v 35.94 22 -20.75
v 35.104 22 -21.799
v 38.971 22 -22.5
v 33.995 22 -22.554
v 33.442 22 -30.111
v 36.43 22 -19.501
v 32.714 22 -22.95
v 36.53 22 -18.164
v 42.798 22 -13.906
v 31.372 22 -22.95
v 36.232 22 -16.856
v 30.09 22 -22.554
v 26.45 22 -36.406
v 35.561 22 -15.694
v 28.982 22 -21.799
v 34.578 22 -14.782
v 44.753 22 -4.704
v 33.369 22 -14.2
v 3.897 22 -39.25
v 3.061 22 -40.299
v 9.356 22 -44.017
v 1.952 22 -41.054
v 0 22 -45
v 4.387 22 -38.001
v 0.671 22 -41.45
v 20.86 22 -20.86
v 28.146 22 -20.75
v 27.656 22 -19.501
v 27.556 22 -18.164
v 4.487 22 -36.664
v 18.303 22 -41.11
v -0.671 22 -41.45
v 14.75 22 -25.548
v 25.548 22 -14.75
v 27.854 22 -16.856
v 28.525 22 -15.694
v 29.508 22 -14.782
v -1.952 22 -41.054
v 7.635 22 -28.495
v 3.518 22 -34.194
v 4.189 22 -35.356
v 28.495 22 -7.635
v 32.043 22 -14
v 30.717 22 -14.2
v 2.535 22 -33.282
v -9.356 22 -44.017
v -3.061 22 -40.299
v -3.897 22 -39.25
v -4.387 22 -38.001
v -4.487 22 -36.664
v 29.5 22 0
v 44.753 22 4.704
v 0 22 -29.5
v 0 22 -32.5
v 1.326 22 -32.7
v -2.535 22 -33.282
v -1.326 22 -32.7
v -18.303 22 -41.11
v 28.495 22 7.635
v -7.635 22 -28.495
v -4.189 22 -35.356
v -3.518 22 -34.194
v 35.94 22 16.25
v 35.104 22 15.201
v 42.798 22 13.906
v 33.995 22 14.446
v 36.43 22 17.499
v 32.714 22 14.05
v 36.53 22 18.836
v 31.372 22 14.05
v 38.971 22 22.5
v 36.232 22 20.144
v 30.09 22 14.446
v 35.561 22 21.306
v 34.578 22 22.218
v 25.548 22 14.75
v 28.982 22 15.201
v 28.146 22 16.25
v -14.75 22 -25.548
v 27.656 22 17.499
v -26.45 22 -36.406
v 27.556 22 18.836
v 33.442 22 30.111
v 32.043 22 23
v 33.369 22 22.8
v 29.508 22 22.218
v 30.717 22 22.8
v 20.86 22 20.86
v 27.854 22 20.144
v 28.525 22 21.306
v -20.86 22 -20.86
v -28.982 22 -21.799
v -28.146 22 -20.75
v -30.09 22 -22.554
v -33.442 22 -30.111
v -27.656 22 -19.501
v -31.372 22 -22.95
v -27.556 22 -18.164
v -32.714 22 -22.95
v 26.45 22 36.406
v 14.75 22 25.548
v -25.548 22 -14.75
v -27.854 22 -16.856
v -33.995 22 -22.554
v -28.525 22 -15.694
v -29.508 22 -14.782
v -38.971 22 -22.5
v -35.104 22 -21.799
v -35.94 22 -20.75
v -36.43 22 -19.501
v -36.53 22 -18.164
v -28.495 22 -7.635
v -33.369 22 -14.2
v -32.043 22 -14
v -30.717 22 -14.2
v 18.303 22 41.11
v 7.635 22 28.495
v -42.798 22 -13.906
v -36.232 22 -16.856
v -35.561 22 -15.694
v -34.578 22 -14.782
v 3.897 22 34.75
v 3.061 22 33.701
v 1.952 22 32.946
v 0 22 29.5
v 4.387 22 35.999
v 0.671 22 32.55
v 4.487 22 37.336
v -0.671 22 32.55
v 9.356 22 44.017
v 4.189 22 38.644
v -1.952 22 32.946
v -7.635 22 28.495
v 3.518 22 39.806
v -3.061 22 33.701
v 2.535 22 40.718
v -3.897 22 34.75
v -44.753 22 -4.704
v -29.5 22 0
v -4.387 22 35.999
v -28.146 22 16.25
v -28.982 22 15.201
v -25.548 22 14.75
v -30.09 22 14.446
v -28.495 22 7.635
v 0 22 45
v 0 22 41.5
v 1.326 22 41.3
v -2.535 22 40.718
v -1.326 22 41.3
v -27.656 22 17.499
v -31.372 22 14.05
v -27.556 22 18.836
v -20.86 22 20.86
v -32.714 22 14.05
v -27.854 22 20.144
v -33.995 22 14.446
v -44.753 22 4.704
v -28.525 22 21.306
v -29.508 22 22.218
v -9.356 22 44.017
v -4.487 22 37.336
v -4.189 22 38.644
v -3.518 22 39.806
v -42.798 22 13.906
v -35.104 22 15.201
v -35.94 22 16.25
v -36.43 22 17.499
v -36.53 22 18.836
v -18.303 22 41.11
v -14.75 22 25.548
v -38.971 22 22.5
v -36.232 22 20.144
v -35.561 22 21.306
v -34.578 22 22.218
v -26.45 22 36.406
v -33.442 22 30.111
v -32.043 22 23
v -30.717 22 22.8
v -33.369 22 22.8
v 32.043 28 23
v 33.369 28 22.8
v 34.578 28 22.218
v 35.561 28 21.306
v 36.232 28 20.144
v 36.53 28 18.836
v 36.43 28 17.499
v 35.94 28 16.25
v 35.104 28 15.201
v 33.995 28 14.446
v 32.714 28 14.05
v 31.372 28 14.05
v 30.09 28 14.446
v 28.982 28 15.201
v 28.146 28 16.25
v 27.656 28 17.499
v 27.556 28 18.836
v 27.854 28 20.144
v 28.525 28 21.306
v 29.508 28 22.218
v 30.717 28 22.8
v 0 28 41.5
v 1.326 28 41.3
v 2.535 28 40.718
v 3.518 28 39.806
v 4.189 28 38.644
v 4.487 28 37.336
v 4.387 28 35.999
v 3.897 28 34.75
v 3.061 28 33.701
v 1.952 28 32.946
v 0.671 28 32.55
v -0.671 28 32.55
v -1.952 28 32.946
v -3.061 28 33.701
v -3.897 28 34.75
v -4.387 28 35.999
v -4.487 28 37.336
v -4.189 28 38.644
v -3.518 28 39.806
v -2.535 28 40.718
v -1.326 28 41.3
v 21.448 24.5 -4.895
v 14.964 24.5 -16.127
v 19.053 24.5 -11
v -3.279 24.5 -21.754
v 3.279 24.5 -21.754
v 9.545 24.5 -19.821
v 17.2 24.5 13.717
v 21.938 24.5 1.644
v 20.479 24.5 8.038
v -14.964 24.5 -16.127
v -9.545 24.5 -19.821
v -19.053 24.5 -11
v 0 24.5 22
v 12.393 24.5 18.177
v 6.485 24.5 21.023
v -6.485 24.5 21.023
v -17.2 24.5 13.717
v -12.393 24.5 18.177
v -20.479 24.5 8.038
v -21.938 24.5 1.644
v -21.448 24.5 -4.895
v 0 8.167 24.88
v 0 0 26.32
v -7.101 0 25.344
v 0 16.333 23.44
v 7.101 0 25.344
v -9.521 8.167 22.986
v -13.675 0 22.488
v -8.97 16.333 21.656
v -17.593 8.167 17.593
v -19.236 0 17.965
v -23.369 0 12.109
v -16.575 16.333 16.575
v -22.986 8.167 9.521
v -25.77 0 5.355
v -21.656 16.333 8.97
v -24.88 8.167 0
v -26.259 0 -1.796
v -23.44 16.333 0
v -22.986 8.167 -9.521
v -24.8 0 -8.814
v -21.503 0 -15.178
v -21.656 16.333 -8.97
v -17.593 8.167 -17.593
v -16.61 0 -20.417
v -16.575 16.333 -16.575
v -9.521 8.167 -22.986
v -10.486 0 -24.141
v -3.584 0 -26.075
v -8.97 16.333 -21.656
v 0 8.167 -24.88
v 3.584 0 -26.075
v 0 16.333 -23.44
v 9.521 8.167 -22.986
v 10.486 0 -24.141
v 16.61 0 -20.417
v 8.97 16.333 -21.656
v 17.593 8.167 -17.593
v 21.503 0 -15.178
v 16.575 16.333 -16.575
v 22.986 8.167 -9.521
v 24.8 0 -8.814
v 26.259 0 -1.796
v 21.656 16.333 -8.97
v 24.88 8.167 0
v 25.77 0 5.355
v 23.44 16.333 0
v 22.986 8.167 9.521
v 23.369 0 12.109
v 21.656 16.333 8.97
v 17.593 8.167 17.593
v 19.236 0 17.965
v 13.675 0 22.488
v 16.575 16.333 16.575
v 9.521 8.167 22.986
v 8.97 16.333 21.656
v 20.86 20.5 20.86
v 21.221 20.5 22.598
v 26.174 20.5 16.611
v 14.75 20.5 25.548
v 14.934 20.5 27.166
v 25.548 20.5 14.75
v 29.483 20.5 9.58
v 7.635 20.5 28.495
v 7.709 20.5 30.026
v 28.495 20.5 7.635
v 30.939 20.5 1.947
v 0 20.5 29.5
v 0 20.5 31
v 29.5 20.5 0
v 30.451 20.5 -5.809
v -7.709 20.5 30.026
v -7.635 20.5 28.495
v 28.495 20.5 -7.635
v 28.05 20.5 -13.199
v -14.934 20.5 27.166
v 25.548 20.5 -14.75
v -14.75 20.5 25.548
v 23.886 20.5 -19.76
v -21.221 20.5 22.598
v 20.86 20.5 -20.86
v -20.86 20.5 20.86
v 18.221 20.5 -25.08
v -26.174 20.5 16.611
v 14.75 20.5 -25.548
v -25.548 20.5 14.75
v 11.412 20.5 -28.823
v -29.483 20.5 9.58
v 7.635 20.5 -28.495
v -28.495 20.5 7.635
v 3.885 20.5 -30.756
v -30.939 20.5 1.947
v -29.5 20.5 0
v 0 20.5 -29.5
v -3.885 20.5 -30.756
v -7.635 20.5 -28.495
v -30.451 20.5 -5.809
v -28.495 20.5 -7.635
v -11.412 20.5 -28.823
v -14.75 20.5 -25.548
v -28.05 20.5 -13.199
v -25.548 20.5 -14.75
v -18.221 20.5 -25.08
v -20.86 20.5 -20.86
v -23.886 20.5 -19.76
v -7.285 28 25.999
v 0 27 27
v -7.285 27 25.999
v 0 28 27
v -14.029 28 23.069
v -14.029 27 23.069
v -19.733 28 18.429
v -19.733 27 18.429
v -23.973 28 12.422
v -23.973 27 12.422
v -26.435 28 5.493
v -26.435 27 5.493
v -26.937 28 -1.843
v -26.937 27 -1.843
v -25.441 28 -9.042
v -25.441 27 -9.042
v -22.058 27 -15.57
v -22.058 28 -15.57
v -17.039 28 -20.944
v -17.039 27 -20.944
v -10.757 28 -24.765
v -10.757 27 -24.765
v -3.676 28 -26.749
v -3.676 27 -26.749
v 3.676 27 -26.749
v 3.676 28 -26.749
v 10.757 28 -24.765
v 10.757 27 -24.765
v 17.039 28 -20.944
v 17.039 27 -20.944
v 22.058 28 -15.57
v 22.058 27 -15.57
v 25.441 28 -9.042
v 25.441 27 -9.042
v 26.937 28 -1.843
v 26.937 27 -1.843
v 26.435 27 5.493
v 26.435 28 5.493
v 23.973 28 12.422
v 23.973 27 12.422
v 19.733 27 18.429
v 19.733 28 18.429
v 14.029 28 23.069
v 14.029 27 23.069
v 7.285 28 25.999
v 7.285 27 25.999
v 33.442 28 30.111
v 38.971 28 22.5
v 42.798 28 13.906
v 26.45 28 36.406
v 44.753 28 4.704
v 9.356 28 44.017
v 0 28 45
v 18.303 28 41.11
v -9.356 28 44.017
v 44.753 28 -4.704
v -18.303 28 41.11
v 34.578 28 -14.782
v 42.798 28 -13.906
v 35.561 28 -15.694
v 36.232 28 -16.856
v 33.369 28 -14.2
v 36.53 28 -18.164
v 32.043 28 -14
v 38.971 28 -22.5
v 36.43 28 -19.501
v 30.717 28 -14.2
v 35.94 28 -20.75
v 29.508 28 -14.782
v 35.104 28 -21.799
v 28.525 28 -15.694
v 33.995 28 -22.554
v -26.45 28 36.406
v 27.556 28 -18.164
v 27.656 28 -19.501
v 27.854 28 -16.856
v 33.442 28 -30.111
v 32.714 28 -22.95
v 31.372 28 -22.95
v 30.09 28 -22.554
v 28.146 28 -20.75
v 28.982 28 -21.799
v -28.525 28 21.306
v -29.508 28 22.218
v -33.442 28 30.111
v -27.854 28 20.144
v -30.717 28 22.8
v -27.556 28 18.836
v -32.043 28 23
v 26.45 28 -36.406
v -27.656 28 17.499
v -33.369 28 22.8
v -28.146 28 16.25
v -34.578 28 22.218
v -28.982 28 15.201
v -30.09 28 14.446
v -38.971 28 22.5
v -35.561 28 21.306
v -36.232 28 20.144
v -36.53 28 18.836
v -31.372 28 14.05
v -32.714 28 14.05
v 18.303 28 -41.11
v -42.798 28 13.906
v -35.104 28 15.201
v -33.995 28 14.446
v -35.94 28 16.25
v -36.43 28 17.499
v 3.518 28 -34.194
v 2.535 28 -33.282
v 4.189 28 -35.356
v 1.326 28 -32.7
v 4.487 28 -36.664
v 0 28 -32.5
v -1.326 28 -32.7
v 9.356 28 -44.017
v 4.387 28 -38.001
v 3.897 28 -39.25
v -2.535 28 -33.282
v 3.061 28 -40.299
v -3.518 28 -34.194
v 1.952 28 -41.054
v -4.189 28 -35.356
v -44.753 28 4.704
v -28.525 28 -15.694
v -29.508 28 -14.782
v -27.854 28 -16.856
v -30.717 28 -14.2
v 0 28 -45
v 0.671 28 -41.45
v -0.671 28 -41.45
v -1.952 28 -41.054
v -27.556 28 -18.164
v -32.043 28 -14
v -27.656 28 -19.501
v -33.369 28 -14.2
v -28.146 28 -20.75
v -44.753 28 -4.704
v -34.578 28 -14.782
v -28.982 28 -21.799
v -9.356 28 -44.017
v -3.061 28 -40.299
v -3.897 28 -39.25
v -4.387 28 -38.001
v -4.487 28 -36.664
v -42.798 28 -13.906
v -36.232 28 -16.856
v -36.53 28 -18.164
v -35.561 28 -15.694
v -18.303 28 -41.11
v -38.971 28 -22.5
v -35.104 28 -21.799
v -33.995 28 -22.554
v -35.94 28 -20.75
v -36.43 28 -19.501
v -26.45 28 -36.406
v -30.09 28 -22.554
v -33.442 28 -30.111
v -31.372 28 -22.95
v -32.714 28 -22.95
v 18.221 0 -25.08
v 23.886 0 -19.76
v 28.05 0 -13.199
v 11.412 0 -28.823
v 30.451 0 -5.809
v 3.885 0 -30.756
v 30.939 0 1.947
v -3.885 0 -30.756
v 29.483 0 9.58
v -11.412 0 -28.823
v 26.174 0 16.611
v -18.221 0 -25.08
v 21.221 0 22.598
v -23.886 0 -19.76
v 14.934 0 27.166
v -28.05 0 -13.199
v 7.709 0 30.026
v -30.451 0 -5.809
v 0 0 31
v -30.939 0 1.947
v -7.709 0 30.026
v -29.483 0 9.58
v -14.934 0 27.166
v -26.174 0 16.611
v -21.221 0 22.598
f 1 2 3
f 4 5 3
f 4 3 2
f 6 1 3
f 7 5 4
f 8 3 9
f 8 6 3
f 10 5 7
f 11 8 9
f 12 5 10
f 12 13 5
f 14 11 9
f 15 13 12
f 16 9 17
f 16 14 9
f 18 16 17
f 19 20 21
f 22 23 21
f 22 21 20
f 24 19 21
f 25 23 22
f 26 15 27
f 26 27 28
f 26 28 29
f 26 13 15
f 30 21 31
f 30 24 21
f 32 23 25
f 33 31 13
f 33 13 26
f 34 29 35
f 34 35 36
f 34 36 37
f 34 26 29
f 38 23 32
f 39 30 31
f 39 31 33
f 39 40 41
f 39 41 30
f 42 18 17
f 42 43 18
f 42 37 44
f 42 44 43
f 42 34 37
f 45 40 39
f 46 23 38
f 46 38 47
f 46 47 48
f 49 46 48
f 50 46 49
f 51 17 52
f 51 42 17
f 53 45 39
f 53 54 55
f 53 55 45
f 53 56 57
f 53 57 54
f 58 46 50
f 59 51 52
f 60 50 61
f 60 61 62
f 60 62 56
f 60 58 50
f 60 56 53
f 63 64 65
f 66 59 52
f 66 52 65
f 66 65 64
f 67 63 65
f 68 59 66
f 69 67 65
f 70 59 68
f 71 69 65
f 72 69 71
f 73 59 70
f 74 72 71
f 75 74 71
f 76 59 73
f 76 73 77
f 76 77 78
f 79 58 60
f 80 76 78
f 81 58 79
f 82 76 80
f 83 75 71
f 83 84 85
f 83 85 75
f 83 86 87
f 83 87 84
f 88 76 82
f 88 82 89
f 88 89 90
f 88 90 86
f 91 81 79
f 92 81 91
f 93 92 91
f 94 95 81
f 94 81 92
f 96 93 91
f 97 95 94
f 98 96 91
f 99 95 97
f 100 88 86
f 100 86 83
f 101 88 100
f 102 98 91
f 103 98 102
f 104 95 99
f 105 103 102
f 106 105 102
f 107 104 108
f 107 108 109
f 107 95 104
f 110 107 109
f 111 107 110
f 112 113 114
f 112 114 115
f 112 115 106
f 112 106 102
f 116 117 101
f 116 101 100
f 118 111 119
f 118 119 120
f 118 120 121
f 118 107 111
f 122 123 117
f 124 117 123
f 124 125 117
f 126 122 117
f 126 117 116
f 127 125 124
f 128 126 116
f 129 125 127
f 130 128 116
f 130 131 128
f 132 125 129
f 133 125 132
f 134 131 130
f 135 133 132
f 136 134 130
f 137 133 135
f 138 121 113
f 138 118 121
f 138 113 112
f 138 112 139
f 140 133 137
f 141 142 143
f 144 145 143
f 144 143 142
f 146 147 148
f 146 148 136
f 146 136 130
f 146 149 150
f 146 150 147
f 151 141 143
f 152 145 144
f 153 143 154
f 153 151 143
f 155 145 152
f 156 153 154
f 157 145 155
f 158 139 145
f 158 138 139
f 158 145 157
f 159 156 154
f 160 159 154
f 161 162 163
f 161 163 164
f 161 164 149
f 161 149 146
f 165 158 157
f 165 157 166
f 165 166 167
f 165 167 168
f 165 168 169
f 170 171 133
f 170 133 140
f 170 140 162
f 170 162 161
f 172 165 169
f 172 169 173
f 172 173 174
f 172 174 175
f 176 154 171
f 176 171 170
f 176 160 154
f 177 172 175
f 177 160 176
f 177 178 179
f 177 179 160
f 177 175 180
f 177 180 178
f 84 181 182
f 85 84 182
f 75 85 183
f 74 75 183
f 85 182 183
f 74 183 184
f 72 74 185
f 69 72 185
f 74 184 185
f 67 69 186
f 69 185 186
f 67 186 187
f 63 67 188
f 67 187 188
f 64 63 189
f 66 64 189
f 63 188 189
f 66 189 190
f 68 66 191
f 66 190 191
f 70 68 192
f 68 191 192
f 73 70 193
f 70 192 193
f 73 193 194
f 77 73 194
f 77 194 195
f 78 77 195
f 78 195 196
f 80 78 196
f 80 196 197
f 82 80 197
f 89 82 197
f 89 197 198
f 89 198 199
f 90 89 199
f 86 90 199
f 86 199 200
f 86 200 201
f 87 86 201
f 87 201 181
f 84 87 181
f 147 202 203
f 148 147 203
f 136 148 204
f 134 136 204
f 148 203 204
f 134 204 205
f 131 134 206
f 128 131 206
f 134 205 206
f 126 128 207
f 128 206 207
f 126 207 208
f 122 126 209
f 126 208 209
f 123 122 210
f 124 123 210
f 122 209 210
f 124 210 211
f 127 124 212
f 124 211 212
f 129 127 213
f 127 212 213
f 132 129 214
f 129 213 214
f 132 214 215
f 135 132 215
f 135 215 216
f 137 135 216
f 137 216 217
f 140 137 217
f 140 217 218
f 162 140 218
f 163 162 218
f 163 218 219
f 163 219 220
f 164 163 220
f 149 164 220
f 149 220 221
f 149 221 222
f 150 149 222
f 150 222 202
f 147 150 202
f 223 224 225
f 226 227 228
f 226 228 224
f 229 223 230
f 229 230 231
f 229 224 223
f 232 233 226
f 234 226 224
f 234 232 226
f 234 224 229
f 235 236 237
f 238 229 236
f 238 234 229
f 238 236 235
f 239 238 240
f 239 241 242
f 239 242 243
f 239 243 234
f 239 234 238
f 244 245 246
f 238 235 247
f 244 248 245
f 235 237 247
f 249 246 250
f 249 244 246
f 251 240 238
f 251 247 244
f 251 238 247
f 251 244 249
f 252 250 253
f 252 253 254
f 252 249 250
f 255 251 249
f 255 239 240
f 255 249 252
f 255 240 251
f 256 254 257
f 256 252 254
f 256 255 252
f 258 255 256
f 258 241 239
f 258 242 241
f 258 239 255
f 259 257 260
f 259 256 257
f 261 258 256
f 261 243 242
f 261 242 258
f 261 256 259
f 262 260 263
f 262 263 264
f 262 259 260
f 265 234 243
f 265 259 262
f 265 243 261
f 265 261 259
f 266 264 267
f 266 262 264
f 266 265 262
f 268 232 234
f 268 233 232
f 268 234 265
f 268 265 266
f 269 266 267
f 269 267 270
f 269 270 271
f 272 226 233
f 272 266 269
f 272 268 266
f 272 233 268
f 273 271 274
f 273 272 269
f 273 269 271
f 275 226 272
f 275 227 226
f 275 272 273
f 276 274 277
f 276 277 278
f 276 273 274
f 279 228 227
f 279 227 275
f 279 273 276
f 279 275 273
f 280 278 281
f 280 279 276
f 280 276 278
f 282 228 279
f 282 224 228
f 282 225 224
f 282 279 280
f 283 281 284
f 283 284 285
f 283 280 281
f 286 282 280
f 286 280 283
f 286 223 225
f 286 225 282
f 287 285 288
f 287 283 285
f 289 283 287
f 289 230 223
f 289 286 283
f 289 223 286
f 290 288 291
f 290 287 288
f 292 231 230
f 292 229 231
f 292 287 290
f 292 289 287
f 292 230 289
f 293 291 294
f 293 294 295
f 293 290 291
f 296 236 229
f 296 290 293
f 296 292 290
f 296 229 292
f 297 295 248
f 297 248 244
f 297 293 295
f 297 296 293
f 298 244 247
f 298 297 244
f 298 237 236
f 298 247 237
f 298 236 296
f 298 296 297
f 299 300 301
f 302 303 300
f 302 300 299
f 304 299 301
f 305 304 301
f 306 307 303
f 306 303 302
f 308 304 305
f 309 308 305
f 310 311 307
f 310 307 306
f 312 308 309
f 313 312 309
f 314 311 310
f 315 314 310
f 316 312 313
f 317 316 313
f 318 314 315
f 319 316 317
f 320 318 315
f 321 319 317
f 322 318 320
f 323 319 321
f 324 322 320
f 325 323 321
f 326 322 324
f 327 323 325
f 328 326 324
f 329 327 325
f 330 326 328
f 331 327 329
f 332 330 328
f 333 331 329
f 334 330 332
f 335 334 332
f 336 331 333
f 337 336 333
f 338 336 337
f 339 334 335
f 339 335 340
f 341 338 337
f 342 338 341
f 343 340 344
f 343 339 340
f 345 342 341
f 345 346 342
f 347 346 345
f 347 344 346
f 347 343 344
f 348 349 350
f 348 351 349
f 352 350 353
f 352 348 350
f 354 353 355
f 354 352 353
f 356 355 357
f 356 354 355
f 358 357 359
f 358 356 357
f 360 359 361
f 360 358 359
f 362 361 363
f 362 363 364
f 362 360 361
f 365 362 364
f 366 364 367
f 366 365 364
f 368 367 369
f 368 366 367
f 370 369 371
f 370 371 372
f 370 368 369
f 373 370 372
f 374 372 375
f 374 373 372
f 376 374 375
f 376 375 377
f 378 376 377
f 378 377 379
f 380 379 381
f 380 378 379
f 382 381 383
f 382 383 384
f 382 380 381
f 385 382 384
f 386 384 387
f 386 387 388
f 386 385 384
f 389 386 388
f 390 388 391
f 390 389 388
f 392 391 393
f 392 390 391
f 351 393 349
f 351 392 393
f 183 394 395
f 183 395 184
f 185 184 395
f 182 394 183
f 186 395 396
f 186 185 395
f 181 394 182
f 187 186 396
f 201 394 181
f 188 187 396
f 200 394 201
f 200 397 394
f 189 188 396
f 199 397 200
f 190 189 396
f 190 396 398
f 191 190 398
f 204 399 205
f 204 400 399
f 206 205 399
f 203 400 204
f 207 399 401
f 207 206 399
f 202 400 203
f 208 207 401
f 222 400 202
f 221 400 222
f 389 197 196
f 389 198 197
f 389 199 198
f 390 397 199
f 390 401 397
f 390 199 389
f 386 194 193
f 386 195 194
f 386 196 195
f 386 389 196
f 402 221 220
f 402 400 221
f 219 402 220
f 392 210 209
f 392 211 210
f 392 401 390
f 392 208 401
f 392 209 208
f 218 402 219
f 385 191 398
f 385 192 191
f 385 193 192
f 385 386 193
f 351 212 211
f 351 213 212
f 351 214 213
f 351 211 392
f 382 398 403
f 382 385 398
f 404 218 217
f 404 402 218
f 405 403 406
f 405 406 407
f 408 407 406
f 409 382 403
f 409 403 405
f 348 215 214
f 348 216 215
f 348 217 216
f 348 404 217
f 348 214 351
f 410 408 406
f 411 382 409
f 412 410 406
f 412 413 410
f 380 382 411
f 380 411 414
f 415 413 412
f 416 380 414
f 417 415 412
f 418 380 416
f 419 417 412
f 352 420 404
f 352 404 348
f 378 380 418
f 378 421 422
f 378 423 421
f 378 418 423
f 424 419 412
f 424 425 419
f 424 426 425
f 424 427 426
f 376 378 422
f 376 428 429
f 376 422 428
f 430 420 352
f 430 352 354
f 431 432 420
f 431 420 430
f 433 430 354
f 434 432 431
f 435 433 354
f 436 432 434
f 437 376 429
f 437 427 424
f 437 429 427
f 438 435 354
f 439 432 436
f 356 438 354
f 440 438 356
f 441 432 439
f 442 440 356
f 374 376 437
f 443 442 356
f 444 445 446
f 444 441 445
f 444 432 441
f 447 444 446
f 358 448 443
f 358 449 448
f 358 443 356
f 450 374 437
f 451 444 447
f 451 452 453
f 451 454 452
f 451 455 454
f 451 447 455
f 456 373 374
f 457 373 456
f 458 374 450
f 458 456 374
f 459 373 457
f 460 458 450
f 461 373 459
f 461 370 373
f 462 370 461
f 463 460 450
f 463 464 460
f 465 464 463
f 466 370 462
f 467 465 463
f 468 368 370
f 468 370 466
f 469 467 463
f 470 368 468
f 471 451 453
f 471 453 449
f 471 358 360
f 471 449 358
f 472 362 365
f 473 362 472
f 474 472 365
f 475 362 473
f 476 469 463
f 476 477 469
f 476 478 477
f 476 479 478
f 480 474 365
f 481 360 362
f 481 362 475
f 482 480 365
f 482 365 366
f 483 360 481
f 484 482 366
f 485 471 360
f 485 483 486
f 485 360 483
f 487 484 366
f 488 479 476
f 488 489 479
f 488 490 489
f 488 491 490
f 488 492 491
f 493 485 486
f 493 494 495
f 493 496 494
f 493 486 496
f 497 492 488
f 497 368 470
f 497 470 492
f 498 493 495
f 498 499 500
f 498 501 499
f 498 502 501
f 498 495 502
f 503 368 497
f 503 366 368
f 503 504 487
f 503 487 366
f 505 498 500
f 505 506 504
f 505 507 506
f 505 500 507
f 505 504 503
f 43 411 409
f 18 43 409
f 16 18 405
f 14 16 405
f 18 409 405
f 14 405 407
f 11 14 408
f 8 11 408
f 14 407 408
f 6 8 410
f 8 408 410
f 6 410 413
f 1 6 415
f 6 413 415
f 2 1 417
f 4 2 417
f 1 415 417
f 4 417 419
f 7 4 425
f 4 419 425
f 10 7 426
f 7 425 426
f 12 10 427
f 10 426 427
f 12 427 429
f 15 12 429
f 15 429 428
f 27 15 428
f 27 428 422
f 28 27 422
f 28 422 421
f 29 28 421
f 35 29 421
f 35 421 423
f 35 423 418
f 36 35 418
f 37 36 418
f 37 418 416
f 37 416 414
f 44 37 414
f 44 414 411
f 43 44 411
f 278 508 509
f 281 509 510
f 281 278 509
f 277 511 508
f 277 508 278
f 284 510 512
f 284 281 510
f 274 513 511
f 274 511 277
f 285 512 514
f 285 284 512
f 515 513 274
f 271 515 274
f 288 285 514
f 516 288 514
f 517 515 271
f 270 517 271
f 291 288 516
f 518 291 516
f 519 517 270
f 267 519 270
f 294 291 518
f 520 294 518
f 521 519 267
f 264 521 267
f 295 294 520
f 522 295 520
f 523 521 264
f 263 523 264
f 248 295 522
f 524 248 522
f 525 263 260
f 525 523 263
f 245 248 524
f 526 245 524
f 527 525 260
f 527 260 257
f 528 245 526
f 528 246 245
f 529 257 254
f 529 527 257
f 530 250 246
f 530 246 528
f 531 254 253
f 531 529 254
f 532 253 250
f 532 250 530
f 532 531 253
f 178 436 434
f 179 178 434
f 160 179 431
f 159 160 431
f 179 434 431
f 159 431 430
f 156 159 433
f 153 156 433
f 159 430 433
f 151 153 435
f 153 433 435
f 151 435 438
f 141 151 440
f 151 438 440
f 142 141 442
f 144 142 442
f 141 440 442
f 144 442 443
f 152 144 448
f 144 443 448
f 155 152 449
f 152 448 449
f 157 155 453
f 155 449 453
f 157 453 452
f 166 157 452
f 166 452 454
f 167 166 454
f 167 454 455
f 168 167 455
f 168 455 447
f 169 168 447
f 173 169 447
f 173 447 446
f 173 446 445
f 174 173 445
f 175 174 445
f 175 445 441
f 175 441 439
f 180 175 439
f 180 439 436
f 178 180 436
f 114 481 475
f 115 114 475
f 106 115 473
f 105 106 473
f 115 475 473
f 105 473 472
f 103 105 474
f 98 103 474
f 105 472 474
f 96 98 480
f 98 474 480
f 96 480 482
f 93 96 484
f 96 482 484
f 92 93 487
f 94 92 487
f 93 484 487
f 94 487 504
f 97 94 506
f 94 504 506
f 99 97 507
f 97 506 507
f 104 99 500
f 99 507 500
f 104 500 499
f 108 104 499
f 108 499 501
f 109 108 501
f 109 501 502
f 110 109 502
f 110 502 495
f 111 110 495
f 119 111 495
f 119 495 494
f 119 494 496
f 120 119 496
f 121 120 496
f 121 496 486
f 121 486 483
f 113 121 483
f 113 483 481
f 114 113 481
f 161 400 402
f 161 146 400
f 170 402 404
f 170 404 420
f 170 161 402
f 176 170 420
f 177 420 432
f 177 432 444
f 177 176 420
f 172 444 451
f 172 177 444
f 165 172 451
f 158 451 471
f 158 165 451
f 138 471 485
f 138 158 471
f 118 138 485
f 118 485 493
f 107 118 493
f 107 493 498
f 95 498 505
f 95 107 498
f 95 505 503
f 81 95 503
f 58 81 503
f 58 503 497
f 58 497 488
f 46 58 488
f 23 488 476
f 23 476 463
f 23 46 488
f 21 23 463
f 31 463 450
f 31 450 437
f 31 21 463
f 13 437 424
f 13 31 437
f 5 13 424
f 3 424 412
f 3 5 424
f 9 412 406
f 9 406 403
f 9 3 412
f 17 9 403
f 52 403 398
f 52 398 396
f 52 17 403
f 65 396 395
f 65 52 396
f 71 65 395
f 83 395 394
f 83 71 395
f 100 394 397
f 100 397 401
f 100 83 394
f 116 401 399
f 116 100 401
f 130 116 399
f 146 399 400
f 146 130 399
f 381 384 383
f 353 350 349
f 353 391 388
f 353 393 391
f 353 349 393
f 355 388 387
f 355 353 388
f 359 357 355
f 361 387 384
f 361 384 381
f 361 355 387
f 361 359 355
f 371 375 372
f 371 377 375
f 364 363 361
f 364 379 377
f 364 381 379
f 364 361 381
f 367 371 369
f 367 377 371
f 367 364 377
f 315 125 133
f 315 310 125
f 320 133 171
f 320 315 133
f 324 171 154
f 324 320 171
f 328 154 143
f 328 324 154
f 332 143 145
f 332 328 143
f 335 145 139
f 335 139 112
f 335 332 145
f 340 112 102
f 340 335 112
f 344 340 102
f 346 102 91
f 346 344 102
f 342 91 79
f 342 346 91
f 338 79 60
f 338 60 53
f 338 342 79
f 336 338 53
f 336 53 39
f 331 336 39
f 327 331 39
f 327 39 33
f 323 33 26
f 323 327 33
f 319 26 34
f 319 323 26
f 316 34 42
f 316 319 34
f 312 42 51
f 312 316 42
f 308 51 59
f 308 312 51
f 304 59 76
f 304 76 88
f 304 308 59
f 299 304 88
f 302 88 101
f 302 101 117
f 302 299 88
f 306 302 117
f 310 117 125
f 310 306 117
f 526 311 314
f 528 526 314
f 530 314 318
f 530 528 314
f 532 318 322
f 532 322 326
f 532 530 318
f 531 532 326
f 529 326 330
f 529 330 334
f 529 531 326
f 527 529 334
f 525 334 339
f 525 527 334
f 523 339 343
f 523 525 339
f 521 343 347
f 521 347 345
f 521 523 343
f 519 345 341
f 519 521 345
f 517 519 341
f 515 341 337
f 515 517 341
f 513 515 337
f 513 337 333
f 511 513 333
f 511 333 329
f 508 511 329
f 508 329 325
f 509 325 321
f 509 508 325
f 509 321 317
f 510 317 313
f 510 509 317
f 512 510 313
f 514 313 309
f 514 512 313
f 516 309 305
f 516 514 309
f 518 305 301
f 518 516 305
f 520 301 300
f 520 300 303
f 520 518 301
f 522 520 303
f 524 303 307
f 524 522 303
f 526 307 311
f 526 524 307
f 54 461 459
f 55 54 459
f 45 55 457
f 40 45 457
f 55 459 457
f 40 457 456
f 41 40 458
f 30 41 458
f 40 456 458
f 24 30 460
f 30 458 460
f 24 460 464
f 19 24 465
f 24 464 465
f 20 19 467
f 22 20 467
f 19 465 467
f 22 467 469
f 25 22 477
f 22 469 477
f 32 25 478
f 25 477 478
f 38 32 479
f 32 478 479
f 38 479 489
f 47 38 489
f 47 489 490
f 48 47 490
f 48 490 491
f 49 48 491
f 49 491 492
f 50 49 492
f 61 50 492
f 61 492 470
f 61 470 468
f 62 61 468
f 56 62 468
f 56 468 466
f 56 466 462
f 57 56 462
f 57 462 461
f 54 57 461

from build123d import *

# Parameters (mm, degrees)
CUT_EXTRUDE1_REACH = 71.527
SKETCH2_R          = 4.5


with BuildPart() as part:
    # Sketch1 → Revolve1 (revolve)
    with BuildSketch(Plane.XY, mode=Mode.PRIVATE) as revolve1_sk:
        Polygon((-45, 28), (-45, 22), (-29.5, 22), (-29.5, 20.5), (-31, 20.5), (-31, 0), (-26.320011027, 0), (-22, 24.5), (0, 24.5), (0, 27), (-27, 27), (-27, 28), align=None)
    revolve(revolve1_sk.sketch.rotate(Axis((0, 30.618797564, 0), (0, -1, 0)), 270), axis=Axis((0, 30.618797564, 0), (0, -1, 0)))

    # Sketch2 → Cut-Extrude1 (cut, up to next)
    with BuildSketch(Plane(origin=(0, 28, 0), x_dir=(1, 0, 0), z_dir=(0, 1, 0)), mode=Mode.PRIVATE) as cut_extrude1_sk1:
        with Locations(Location((0, 37, 0), (0, 0, 270))):
            Circle(SKETCH2_R)
    cut_extrude1_tool1 = extrude(cut_extrude1_sk1.sketch, amount=-CUT_EXTRUDE1_REACH, mode=Mode.PRIVATE) & part.part
    # Sketch2 → Cut-Extrude1 (cut, up to next)
    with BuildSketch(Plane(origin=(0, 28, 0), x_dir=(1, 0, 0), z_dir=(0, 1, 0)), mode=Mode.PRIVATE) as cut_extrude1_sk2:
        with Locations(Location((32.04293994, 18.5, 0), (0, 0, 270))):
            Circle(SKETCH2_R)
    cut_extrude1_tool2 = extrude(cut_extrude1_sk2.sketch, amount=-CUT_EXTRUDE1_REACH, mode=Mode.PRIVATE) & part.part
    # Sketch2 → Cut-Extrude1 (cut, up to next)
    with BuildSketch(Plane(origin=(0, 28, 0), x_dir=(1, 0, 0), z_dir=(0, 1, 0)), mode=Mode.PRIVATE) as cut_extrude1_sk3:
        with Locations(Location((32.04293994, -18.5, 0), (0, 0, 270))):
            Circle(SKETCH2_R)
    cut_extrude1_tool3 = extrude(cut_extrude1_sk3.sketch, amount=-CUT_EXTRUDE1_REACH, mode=Mode.PRIVATE) & part.part
    # Sketch2 → Cut-Extrude1 (cut, up to next)
    with BuildSketch(Plane(origin=(0, 28, 0), x_dir=(1, 0, 0), z_dir=(0, 1, 0)), mode=Mode.PRIVATE) as cut_extrude1_sk4:
        with Locations(Location((0, -37, 0), (0, 0, 270))):
            Circle(SKETCH2_R)
    cut_extrude1_tool4 = extrude(cut_extrude1_sk4.sketch, amount=-CUT_EXTRUDE1_REACH, mode=Mode.PRIVATE) & part.part
    # Sketch2 → Cut-Extrude1 (cut, up to next)
    with BuildSketch(Plane(origin=(0, 28, 0), x_dir=(1, 0, 0), z_dir=(0, 1, 0)), mode=Mode.PRIVATE) as cut_extrude1_sk5:
        with Locations(Location((-32.04293994, -18.5, 0), (0, 0, 270))):
            Circle(SKETCH2_R)
    cut_extrude1_tool5 = extrude(cut_extrude1_sk5.sketch, amount=-CUT_EXTRUDE1_REACH, mode=Mode.PRIVATE) & part.part
    # Sketch2 → Cut-Extrude1 (cut, up to next)
    with BuildSketch(Plane(origin=(0, 28, 0), x_dir=(1, 0, 0), z_dir=(0, 1, 0)), mode=Mode.PRIVATE) as cut_extrude1_sk6:
        with Locations(Location((-32.04293994, 18.5, 0), (0, 0, 270))):
            Circle(SKETCH2_R)
    cut_extrude1_tool6 = extrude(cut_extrude1_sk6.sketch, amount=-CUT_EXTRUDE1_REACH, mode=Mode.PRIVATE) & part.part
    add(cut_extrude1_tool1.solids().sort_by_distance((0, 28, -37))[0], mode=Mode.SUBTRACT)
    add(cut_extrude1_tool2.solids().sort_by_distance((32.04294, 28, -18.5))[0], mode=Mode.SUBTRACT)
    add(cut_extrude1_tool3.solids().sort_by_distance((32.04294, 28, 18.5))[0], mode=Mode.SUBTRACT)
    add(cut_extrude1_tool4.solids().sort_by_distance((0, 28, 37))[0], mode=Mode.SUBTRACT)
    add(cut_extrude1_tool5.solids().sort_by_distance((-32.04294, 28, 18.5))[0], mode=Mode.SUBTRACT)
    add(cut_extrude1_tool6.solids().sort_by_distance((-32.04294, 28, -18.5))[0], mode=Mode.SUBTRACT)


solid = part.part
